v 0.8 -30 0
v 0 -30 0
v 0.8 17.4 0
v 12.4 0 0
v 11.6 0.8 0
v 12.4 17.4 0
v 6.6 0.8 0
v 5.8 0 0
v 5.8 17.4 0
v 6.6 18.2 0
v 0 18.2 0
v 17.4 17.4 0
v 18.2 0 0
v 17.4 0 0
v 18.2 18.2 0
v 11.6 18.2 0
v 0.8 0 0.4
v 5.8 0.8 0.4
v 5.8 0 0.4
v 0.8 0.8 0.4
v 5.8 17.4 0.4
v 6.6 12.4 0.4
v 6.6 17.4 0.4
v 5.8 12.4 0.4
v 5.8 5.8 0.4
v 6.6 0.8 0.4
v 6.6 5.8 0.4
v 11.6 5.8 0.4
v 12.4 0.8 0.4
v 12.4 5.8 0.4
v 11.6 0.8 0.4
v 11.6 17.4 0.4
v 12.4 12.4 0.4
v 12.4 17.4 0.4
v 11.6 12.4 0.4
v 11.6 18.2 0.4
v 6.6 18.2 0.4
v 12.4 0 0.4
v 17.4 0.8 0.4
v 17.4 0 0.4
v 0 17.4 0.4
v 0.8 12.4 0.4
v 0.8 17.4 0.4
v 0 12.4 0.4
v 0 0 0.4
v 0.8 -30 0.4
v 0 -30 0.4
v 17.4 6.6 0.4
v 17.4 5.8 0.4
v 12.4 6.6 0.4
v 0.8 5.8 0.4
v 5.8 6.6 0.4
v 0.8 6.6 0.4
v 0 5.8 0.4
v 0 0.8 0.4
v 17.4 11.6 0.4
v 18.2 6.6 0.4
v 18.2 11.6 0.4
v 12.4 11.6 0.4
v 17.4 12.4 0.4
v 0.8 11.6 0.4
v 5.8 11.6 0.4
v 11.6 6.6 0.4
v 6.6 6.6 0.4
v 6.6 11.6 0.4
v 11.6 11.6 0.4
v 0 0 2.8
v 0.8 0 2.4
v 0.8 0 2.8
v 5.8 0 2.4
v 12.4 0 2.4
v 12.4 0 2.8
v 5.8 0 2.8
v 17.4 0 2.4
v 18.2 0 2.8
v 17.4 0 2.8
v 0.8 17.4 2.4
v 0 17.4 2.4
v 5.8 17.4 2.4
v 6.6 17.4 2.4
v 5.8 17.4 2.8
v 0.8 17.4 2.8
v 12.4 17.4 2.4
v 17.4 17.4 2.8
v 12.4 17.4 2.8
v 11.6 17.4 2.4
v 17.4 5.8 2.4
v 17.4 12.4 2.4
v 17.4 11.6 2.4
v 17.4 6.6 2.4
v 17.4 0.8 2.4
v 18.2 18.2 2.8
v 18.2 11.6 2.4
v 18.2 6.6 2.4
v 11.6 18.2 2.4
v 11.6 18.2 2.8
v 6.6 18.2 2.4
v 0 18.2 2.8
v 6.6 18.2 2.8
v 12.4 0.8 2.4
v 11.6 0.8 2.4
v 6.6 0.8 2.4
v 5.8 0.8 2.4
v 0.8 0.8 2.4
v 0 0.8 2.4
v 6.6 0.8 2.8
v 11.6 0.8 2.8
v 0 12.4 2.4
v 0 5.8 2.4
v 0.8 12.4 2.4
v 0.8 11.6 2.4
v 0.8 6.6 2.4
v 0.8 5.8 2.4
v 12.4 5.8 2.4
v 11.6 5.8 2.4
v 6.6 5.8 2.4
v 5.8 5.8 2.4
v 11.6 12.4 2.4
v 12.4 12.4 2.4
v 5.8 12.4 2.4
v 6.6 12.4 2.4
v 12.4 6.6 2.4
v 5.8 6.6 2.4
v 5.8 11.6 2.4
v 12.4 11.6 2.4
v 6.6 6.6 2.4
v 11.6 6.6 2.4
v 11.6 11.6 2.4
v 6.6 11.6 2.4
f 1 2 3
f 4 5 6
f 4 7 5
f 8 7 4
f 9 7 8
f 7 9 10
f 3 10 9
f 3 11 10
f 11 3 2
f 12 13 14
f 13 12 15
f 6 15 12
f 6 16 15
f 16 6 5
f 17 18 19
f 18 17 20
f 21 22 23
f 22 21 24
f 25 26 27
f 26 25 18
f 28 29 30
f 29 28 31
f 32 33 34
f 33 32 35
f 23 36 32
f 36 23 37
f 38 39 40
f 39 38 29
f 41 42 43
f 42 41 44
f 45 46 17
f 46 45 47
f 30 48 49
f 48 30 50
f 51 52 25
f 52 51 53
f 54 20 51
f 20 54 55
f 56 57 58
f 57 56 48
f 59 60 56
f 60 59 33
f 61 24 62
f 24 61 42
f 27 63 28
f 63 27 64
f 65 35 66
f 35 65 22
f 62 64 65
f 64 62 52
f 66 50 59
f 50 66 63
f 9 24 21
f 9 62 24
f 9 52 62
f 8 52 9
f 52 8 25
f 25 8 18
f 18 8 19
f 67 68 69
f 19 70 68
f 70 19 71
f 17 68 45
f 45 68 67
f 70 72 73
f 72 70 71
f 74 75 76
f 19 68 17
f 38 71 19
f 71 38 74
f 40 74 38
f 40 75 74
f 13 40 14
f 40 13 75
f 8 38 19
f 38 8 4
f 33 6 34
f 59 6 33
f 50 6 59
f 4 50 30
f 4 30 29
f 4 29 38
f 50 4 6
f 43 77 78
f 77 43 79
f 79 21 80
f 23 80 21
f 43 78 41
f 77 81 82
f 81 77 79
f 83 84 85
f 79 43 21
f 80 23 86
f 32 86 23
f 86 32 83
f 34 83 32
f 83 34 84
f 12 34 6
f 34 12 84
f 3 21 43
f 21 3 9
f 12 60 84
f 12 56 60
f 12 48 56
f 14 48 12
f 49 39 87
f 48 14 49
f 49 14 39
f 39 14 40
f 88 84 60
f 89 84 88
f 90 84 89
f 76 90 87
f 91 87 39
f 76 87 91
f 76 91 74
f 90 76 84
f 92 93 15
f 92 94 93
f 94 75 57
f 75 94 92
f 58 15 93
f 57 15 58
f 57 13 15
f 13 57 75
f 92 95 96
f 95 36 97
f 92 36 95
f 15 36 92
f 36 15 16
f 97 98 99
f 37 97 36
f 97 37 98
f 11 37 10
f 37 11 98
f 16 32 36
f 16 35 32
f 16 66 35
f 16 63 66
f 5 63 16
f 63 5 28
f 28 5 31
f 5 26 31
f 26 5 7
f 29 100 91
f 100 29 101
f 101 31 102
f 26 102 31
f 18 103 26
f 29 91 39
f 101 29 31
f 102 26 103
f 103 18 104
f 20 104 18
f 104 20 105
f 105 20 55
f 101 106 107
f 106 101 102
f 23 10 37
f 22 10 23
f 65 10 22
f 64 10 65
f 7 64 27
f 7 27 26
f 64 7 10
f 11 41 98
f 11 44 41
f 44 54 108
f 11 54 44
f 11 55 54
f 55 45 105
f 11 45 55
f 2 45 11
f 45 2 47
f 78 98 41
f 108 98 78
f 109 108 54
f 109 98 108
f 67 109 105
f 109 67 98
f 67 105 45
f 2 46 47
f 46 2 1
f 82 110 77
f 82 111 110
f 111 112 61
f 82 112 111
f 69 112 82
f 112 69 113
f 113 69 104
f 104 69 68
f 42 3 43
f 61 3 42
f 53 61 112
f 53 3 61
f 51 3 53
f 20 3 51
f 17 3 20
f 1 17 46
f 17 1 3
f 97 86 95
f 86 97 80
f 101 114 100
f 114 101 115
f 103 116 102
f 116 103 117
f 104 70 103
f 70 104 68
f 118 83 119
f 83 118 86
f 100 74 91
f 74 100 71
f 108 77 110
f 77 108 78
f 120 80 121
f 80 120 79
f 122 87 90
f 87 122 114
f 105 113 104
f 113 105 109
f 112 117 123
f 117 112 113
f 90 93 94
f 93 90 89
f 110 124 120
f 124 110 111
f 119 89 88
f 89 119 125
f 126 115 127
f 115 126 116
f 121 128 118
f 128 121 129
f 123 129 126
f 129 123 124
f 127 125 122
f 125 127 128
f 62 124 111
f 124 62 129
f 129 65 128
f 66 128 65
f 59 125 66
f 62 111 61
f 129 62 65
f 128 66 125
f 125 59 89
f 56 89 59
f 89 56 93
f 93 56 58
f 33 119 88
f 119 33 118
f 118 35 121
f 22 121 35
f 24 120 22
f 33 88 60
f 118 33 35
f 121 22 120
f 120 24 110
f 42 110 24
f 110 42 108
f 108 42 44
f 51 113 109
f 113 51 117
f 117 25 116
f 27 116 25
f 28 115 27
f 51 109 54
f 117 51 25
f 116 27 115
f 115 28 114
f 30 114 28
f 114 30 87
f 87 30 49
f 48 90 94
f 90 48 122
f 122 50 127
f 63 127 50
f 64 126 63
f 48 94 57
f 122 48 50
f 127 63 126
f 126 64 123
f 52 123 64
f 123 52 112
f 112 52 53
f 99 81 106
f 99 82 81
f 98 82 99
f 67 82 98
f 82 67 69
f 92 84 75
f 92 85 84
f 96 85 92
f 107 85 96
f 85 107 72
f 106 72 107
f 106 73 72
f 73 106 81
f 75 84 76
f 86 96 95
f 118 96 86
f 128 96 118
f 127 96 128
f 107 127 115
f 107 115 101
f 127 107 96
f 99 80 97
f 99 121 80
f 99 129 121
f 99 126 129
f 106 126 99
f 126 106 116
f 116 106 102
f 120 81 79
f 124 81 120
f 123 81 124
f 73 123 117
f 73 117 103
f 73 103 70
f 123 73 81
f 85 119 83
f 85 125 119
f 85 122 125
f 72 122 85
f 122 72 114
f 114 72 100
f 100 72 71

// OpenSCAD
// file: ../../api/v3/reporting.scad
//////////////////////////////////////////////////////////////////////
// LibFile: reporting.scad
// Project: Grid Stack
// FileGroup: API v3 Reporting
// FileSummary: Console report for immutable direct and positive-gap coupons.
// Role: Records the exact environment, dimensions, support strategy, path
//       lengths, qualification status, and deposited-layer counts.
// Requires: API v3 indexes, mathematics, and path generator.
// Exports: report_structural_coupon_object().
//////////////////////////////////////////////////////////////////////

function _bridge_status3(span, process) =
    span <= process[PX3_BRIDGE_MAX]
        ? "within_owner_tested_limit"
        : "exploratory_beyond_owner_tested_limit";

module report_structural_coupon_object(object, report_level = "full") {
    material = object[SCO_MATERIAL];
    nozzle = object[SCO_NOZZLE];
    printer = object[SCO_PRINTER];
    process = object[SCO_PROCESS];
    boundary = object[SCO_BOUNDARY];
    gap = object[SCO_CLEAR_GAP];
    strategy = object[SCO_SUPPORT_STRATEGY];

    echo("--- Grid Stack immutable structural coupon ---");
    echo(str("Object: ", object[SCO_NAME], " revision ", object[SCO_REVISION]));
    echo(str("API/schema: ", object[SCO_REQUIRED_API], "/",
        object[SCO_SCHEMA_VERSION]));
    echo(str("Release/base commit: ", object[SCO_SOURCE_RELEASE], " / ",
        object[SCO_FRAMEWORK_BASE_COMMIT]));
    echo(str("Material/nozzle/printer: ", material[MAT3_FAMILY], " / ",
        nozzle[NZ3_DIAMETER], " mm / ", printer[PRN3_NAME]));
    echo(str("Cells: ", boundary[B3_CELLS_X], " x ", boundary[B3_CELLS_Y]));
    echo(str("Clear spans: ", boundary[B3_CLEAR_SPAN_X], " x ",
        boundary[B3_CLEAR_SPAN_Y], " mm"));
    echo(str("Span status: ",
        _bridge_status3(boundary[B3_CLEAR_SPAN_X], process)));
    echo(str("Outside size: ", boundary_size_x3(boundary, process, nozzle),
        " x ", boundary_size_y3(boundary, process, nozzle), " mm"));
    echo(str("Primitive trace: ", trace_width3(nozzle), " x ",
        trace_height3(process), " mm"));
    echo(str("Structural strand: ", strand_width3(process, nozzle), " x ",
        strand_height3(process), " mm"));
    echo(str("Clear vertical gap: ", gap, " mm"));
    echo(str("Support strategy: ", strategy));
    echo(str("Total modeled height: ", coupon_total_height3(object), " mm"));

    if (report_level == "full") {
        if (strategy == "direct_orthogonal") {
            lower = coupon_path(
                boundary, process, nozzle, 0, object[SCO_LEAD_IN]
            );
            upper = coupon_path(boundary, process, nozzle, 90, 0);
            echo(str("Lower/upper path lengths: ", path_length3(lower),
                " / ", path_length3(upper), " mm"));
            echo(str("Deposited layers: ", 2 * process[PX3_HEIGHT_PASSES]));
        }
        else {
            witness = coupon_path(
                boundary, process, nozzle, 90, object[SCO_LEAD_IN]
            );
            riser = coupon_path(boundary, process, nozzle, 0, 0);
            test = coupon_path(boundary, process, nozzle, 90, 0);
            echo(str("Witness/riser/test path lengths: ",
                path_length3(witness), " / ", path_length3(riser), " / ",
                path_length3(test), " mm"));
            echo(str("Riser deposited layers: ", round(gap_layer_count3(object))));
            echo(str("Total deposited layers: ",
                2 * process[PX3_HEIGHT_PASSES] +
                round(gap_layer_count3(object))));
        }
        echo(str("Status: ", object[SCO_STATUS]));
        echo(str("Notes: ", object[SCO_NOTES]));
    }
}
// file: ../../api/v3/validation.scad
//////////////////////////////////////////////////////////////////////
// LibFile: validation.scad
// Project: Grid Stack
// FileGroup: API v3 Validation
// FileSummary: Validates immutable environment records, count boundaries,
//              support strategy, path continuity, and layer quantization.
// Role: Rejects incompatible or physically floating recipes before geometry
//       is generated.
// Requires: API v3 indexes, mathematics, and path generator.
// Exports: validate_structural_coupon_object().
//////////////////////////////////////////////////////////////////////

module _validate_path3(points, boundary, orientation, lead_in) {
    run_count = orientation == 0
        ? boundary_strand_count_y3(boundary)
        : boundary_strand_count_x3(boundary);

    assert(len(points) == expected_coupon_point_count3(run_count, lead_in),
        "API v3 coupon path has an unexpected point count.");
    assert(!path_has_zero_segment3(points),
        "API v3 coupon path contains a zero-length segment.");
    assert(path_axis_aligned3(points),
        "API v3 coupon path must remain axis-aligned.");
    assert(points[0] != points[len(points) - 1],
        "API v3 coupon path must remain open.");
}

module validate_structural_coupon_object(object) {
    assert(object[SCO_REQUIRED_API] == GRID_STACK_API_VERSION,
        "Saved coupon requires a different Grid Stack API version.");
    assert(object[SCO_SCHEMA_VERSION] == GRID_STACK_COUPON_SCHEMA_VERSION,
        "Saved coupon requires a different coupon schema version.");
    assert(GRID_STACK_RECTANGULAR_FRAMEWORK_VERSION == 2,
        "Saved coupon requires rectangular framework version 2.");

    material = object[SCO_MATERIAL];
    nozzle = object[SCO_NOZZLE];
    printer = object[SCO_PRINTER];
    process = object[SCO_PROCESS];
    boundary = object[SCO_BOUNDARY];
    gap = object[SCO_CLEAR_GAP];
    lead_in = object[SCO_LEAD_IN];
    strategy = object[SCO_SUPPORT_STRATEGY];

    assert(nozzle[NZ3_DIAMETER] > 0,
        "Saved coupon nozzle diameter must be positive.");
    assert(process[PX3_LAYER_H] > 0,
        "Saved coupon layer height must be positive.");
    assert(process[PX3_WIDTH_PASSES] >= 2,
        "Saved coupon structural width requires at least two passes.");
    assert(process[PX3_HEIGHT_PASSES] >= 2,
        "Saved coupon structural height requires at least two layers.");
    assert(process[PX3_MATERIAL] == material[MAT3_NAME],
        "Saved coupon process/material references do not match.");
    assert(process[PX3_NOZZLE] == nozzle[NZ3_NAME],
        "Saved coupon process/nozzle references do not match.");
    assert(process[PX3_PRINTER] == printer[PRN3_NAME],
        "Saved coupon process/printer references do not match.");
    assert(boundary[B3_CELLS_X] > 0 && boundary[B3_CELLS_Y] > 0,
        "Saved coupon cell counts must be positive.");
    assert(boundary[B3_CLEAR_SPAN_X] > 0 &&
           boundary[B3_CLEAR_SPAN_Y] > 0,
        "Saved coupon clear spans must be positive.");
    assert(lead_in >= 0,
        "Saved coupon lead-in cannot be negative.");
    assert(gap >= 0,
        "Saved coupon clear gap cannot be negative.");
    assert(nearly_equal3(gap_layer_count3(object), round(gap_layer_count3(object))),
        "Saved coupon clear gap must equal a whole deposited-layer count.");
    assert(
        (strategy == "direct_orthogonal" && nearly_equal3(gap, 0)) ||
        (strategy == "witness_riser_bridge" && gap > 0),
        "Saved coupon support strategy does not match its clear gap."
    );

    if (strategy == "direct_orthogonal") {
        lower = coupon_path(boundary, process, nozzle, 0, lead_in);
        upper = coupon_path(boundary, process, nozzle, 90, 0);
        _validate_path3(lower, boundary, 0, lead_in);
        _validate_path3(upper, boundary, 90, 0);
        entry = lead_in > 0 ? 1 : 0;
        assert(nearly_equal3(point_distance_2d3(lower[entry], upper[0]), 0),
            "Direct upper path must start on the lower entry crossing.");
    }
    else {
        witness = coupon_path(boundary, process, nozzle, 90, lead_in);
        riser = coupon_path(boundary, process, nozzle, 0, 0);
        test = coupon_path(boundary, process, nozzle, 90, 0);
        _validate_path3(witness, boundary, 90, lead_in);
        _validate_path3(riser, boundary, 0, 0);
        _validate_path3(test, boundary, 90, 0);
        entry = lead_in > 0 ? 1 : 0;
        assert(nearly_equal3(point_distance_2d3(witness[entry], riser[0]), 0),
            "Riser path must start on the witness entry crossing.");
        assert(nearly_equal3(point_distance_2d3(riser[0], test[0]), 0),
            "Upper test path must start on the riser entry crossing.");
        for (i = [0 : len(test) - 1])
            assert(nearly_equal3(point_distance_2d3(test[i], witness[i + entry]), 0),
                "Upper test path must align directly above the witness path.");
    }

    echo("GRID STACK API V3 COUPON VALIDATION: PASS");
}
// file: ../../api/v3/geometry.scad
//////////////////////////////////////////////////////////////////////
// LibFile: geometry.scad
// Project: Grid Stack
// FileGroup: API v3 Printable Geometry
// FileSummary: Creates square-ended structural paths, direct-contact coupons,
//              positive witness/riser/bridge coupons, and simple diagnostics.
// Role: Supplies all geometry used by immutable API v3 recipes without
//       importing mutable workbench geometry.
// Requires: API v3 mathematics and ordered axis-aligned paths.
// Exports: render_direct_coupon(), render_positive_gap_coupon(), and
//          render_coupon_path_debug().
//////////////////////////////////////////////////////////////////////

module _segment_2d3(a, b, width) {
    horizontal = nearly_equal3(a[1], b[1]);
    vertical = nearly_equal3(a[0], b[0]);

    assert(horizontal || vertical,
        "API v3 printable segments must be horizontal or vertical.");
    assert(!nearly_equal3(point_distance_2d3(a, b), 0),
        "API v3 printable segments must have nonzero length.");

    if (horizontal)
        translate([min(a[0], b[0]) - width / 2, a[1] - width / 2])
            square([abs(b[0] - a[0]) + width, width]);
    else
        translate([a[0] - width / 2, min(a[1], b[1]) - width / 2])
            square([width, abs(b[1] - a[1]) + width]);
}

module _path_2d3(points, width) {
    union()
        for (i = [0 : len(points) - 2])
            _segment_2d3(points[i], points[i + 1], width);
}

module _structural_path3(points, process, nozzle) {
    linear_extrude(height = strand_height3(process), convexity = 10)
        _path_2d3(points, strand_width3(process, nozzle));
}

module render_direct_coupon(lower, upper, process, nozzle) {
    union() {
        _structural_path3(lower, process, nozzle);
        translate([0, 0, strand_height3(process)])
            _structural_path3(upper, process, nozzle);
    }
}

module render_positive_gap_coupon(
    witness, riser, test, process, nozzle, clear_gap
) {
    union() {
        _structural_path3(witness, process, nozzle);

        translate([0, 0, strand_height3(process)])
            linear_extrude(height = clear_gap, convexity = 10)
                _path_2d3(riser, strand_width3(process, nozzle));

        translate([0, 0, strand_height3(process) + clear_gap])
            _structural_path3(test, process, nozzle);
    }
}

module _debug_path3(points, z, width) {
    translate([0, 0, z])
        linear_extrude(height = 0.04)
            _path_2d3(points, width);
}

module render_coupon_path_debug(
    lower, upper, riser, process, clear_gap = 0
) {
    width = max(0.12, trace_height3(process));
    _debug_path3(lower, 0, width);
    if (len(riser) > 0)
        _debug_path3(riser, strand_height3(process), width);
    _debug_path3(
        upper,
        strand_height3(process) + clear_gap,
        width
    );
}
// file: ../../api/v3/paths.scad
//////////////////////////////////////////////////////////////////////
// LibFile: paths.scad
// Project: Grid Stack
// FileGroup: API v3 Path Generation
// FileSummary: Generates one open rectangular serpentine centerline from a
//              count boundary for X- or Y-running structural paths.
// Role: Preserves parallel runs, square connectors, optional single lead-in,
//       and one uninterrupted ordered point list per deposited layer.
// Requires: API v3 indexes and mathematics.
// Exports: coupon_path() and expected_coupon_point_count3().
//////////////////////////////////////////////////////////////////////

function _x_rows3(row, count, x_min, x_max, y_min, pitch) =
    row >= count
        ? []
        : let(
            y = y_min + row * pitch,
            x_end = row % 2 == 0 ? x_max : x_min,
            row_end = [x_end, y],
            connector_end = [x_end, y + pitch]
        )
        concat(
            [row_end],
            row < count - 1 ? [connector_end] : [],
            _x_rows3(row + 1, count, x_min, x_max, y_min, pitch)
        );

function _y_columns3(column, count, x_min, y_min, y_max, pitch) =
    column >= count
        ? []
        : let(
            x = x_min + column * pitch,
            y_end = column % 2 == 0 ? y_max : y_min,
            column_end = [x, y_end],
            connector_end = [x + pitch, y_end]
        )
        concat(
            [column_end],
            column < count - 1 ? [connector_end] : [],
            _y_columns3(column + 1, count, x_min, y_min, y_max, pitch)
        );

function expected_coupon_point_count3(run_count, lead_in = 0) =
    2 * run_count + (lead_in > 0 ? 1 : 0);

function coupon_path(
    boundary, process, nozzle, orientation = 0, lead_in = 0
) =
    assert(orientation == 0 || orientation == 90,
        "API v3 coupon orientation must be 0 or 90 degrees.")
    assert(lead_in >= 0,
        "API v3 coupon lead-in cannot be negative.")
    let(
        width = strand_width3(process, nozzle),
        x_min = width / 2,
        y_min = width / 2,
        x_max = boundary_size_x3(boundary, process, nozzle) - width / 2,
        y_max = boundary_size_y3(boundary, process, nozzle) - width / 2,
        entry = [x_min, y_min],
        prefix = lead_in > 0
            ? (orientation == 0
                ? [[x_min - lead_in, y_min], entry]
                : [[x_min, y_min - lead_in], entry])
            : [entry]
    )
    orientation == 0
        ? concat(
            prefix,
            _x_rows3(
                0, boundary_strand_count_y3(boundary),
                x_min, x_max, y_min,
                boundary_pitch_y3(boundary, process, nozzle)
            )
        )
        : concat(
            prefix,
            _y_columns3(
                0, boundary_strand_count_x3(boundary),
                x_min, y_min, y_max,
                boundary_pitch_x3(boundary, process, nozzle)
            )
        );
// file: ../../api/v3/math.scad
//////////////////////////////////////////////////////////////////////
// LibFile: math.scad
// Project: Grid Stack
// FileGroup: API v3 Mathematics
// FileSummary: Pure trace, strand, boundary, path, and layer-count helpers.
// Role: Keeps API v3 calculations isolated and reproducible without importing
//       mutable workbench mathematics.
// Requires: API v3 indexes.
// Exports: nearly_equal3(), trace/strand dimensions, boundary dimensions,
//          path inspection, gap-layer count, and total-height helpers.
//////////////////////////////////////////////////////////////////////

function nearly_equal3(a, b, epsilon = 0.000001) = abs(a - b) <= epsilon;

function trace_width3(nozzle) = nozzle[NZ3_DIAMETER];
function trace_height3(process) = process[PX3_LAYER_H];
function strand_width3(process, nozzle) =
    trace_width3(nozzle) * process[PX3_WIDTH_PASSES];
function strand_height3(process) =
    trace_height3(process) * process[PX3_HEIGHT_PASSES];

function boundary_strand_count_x3(boundary) = boundary[B3_CELLS_X] + 1;
function boundary_strand_count_y3(boundary) = boundary[B3_CELLS_Y] + 1;
function boundary_pitch_x3(boundary, process, nozzle) =
    boundary[B3_CLEAR_SPAN_X] + strand_width3(process, nozzle);
function boundary_pitch_y3(boundary, process, nozzle) =
    boundary[B3_CLEAR_SPAN_Y] + strand_width3(process, nozzle);
function boundary_size_x3(boundary, process, nozzle) =
    boundary[B3_CELLS_X] * boundary[B3_CLEAR_SPAN_X] +
    boundary_strand_count_x3(boundary) * strand_width3(process, nozzle);
function boundary_size_y3(boundary, process, nozzle) =
    boundary[B3_CELLS_Y] * boundary[B3_CLEAR_SPAN_Y] +
    boundary_strand_count_y3(boundary) * strand_width3(process, nozzle);

function point_distance_2d3(a, b) =
    sqrt(pow(b[0] - a[0], 2) + pow(b[1] - a[1], 2));
function path_length3(points, i = 0) =
    i >= len(points) - 1
        ? 0
        : point_distance_2d3(points[i], points[i + 1]) +
          path_length3(points, i + 1);
function path_has_zero_segment3(points, i = 0) =
    i >= len(points) - 1
        ? false
        : nearly_equal3(point_distance_2d3(points[i], points[i + 1]), 0)
            ? true
            : path_has_zero_segment3(points, i + 1);
function segment_axis_aligned3(a, b) =
    nearly_equal3(a[0], b[0]) || nearly_equal3(a[1], b[1]);
function path_axis_aligned3(points, i = 0) =
    i >= len(points) - 1
        ? true
        : segment_axis_aligned3(points[i], points[i + 1]) &&
          path_axis_aligned3(points, i + 1);

function gap_layer_count3(object) =
    object[SCO_CLEAR_GAP] / trace_height3(object[SCO_PROCESS]);
function coupon_total_height3(object) =
    2 * strand_height3(object[SCO_PROCESS]) + object[SCO_CLEAR_GAP];
// file: ../../api/v3/schema.scad
//////////////////////////////////////////////////////////////////////
// LibFile: schema.scad
// Project: Grid Stack
// FileGroup: API v3 Data Model
// FileSummary: Constructors for self-contained immutable structural coupons.
// Role: Makes every geometry-affecting environment and object value explicit
//       inside the saved recipe rather than resolving mutable catalog names.
// Exports: material_spec(), nozzle_spec(), printer_spec(),
//          structural_process_profile(), count_boundary(), and
//          structural_coupon_object().
//////////////////////////////////////////////////////////////////////

function material_spec(
    name, family, flexibility, status = "in_use", notes = ""
) = [name, family, flexibility, status, notes];

function nozzle_spec(
    name, diameter, construction = "brass", status = "in_use", notes = ""
) = [name, diameter, construction, status, notes];

function printer_spec(
    name,
    manufacturer = "",
    model = "",
    motion_system = "",
    build_surface = "",
    status = "unrecorded",
    notes = ""
) = [
    name, manufacturer, model, motion_system,
    build_surface, status, notes
];

function structural_process_profile(
    name,
    material_name,
    nozzle_name,
    printer_name,
    layer_height,
    width_passes,
    height_passes,
    bridge_max,
    qualification,
    revision,
    notes = ""
) = [
    name, material_name, nozzle_name, printer_name,
    layer_height, width_passes, height_passes, bridge_max,
    qualification, revision, notes
];

// Function: count_boundary()
// Synopsis: Stores clear-opening counts and clear spans for one rectangle.
function count_boundary(
    name,
    cells_x,
    cells_y,
    clear_span_x,
    clear_span_y,
    notes = ""
) = [name, cells_x, cells_y, clear_span_x, clear_span_y, notes];

// Function: structural_coupon_object()
// Synopsis: Constructs one permanent coupon recipe.
// Description:
//   framework_base_commit records the last accepted repository state used to
//   begin the API implementation. The Git commit containing this recipe is the
//   authoritative complete source; a file cannot embed its own future hash.
function structural_coupon_object(
    name,
    revision,
    required_api_version,
    coupon_schema_version,
    source_release,
    framework_base_commit,
    material,
    nozzle,
    printer,
    process,
    boundary,
    clear_vertical_gap,
    lead_in,
    support_strategy,
    status = "calibration",
    notes = ""
) = [
    name,
    revision,
    required_api_version,
    coupon_schema_version,
    source_release,
    framework_base_commit,
    material,
    nozzle,
    printer,
    process,
    boundary,
    clear_vertical_gap,
    lead_in,
    support_strategy,
    status,
    notes
];
// file: ../../api/v3/indices.scad
//////////////////////////////////////////////////////////////////////
// LibFile: indices.scad
// Project: Grid Stack
// FileGroup: API v3 Data Model
// FileSummary: Named indexes for immutable structural-coupon records.
// Role: Prevents unexplained numeric indexes from entering saved recipes and
//       keeps API version 3 independent of mutable workbench indexes.
// Exports: MAT3_*, NZ3_*, PRN3_*, PX3_*, B3_*, and SCO_* constants.
//////////////////////////////////////////////////////////////////////

MAT3_NAME = 0;
MAT3_FAMILY = 1;
MAT3_FLEXIBILITY = 2;
MAT3_STATUS = 3;
MAT3_NOTES = 4;

NZ3_NAME = 0;
NZ3_DIAMETER = 1;
NZ3_CONSTRUCTION = 2;
NZ3_STATUS = 3;
NZ3_NOTES = 4;

PRN3_NAME = 0;
PRN3_MANUFACTURER = 1;
PRN3_MODEL = 2;
PRN3_MOTION_SYSTEM = 3;
PRN3_BUILD_SURFACE = 4;
PRN3_STATUS = 5;
PRN3_NOTES = 6;

PX3_NAME = 0;
PX3_MATERIAL = 1;
PX3_NOZZLE = 2;
PX3_PRINTER = 3;
PX3_LAYER_H = 4;
PX3_WIDTH_PASSES = 5;
PX3_HEIGHT_PASSES = 6;
PX3_BRIDGE_MAX = 7;
PX3_QUALIFICATION = 8;
PX3_REVISION = 9;
PX3_NOTES = 10;

B3_NAME = 0;
B3_CELLS_X = 1;
B3_CELLS_Y = 2;
B3_CLEAR_SPAN_X = 3;
B3_CLEAR_SPAN_Y = 4;
B3_NOTES = 5;

SCO_NAME = 0;
SCO_REVISION = 1;
SCO_REQUIRED_API = 2;
SCO_SCHEMA_VERSION = 3;
SCO_SOURCE_RELEASE = 4;
SCO_FRAMEWORK_BASE_COMMIT = 5;
SCO_MATERIAL = 6;
SCO_NOZZLE = 7;
SCO_PRINTER = 8;
SCO_PROCESS = 9;
SCO_BOUNDARY = 10;
SCO_CLEAR_GAP = 11;
SCO_LEAD_IN = 12;
SCO_SUPPORT_STRATEGY = 13;
SCO_STATUS = 14;
SCO_NOTES = 15;
// file: ../../api/grid_stack_v3.scad
//////////////////////////////////////////////////////////////////////
// LibFile: grid_stack_v3.scad
// Project: Grid Stack
// FileGroup: Versioned Public Interface
// FileSummary: Immutable API version 3 for rectangular count-boundary
//              structural coupons, including positive witness/riser gaps.
// Role: Reconstructs saved coupon recipes without Customizer state or mutable
//       workbench catalogs. Incompatible behavior requires a new API file.
// Exports: API/schema constants, record constructors, validation, reporting,
//          and structural_coupon_render().
//////////////////////////////////////////////////////////////////////

GRID_STACK_API_VERSION = 3;
GRID_STACK_COUPON_SCHEMA_VERSION = 1;
GRID_STACK_RECTANGULAR_FRAMEWORK_VERSION = 2;
GRID_STACK_RELEASE = "1.0.0";

include <v3/indices.scad>
include <v3/schema.scad>
include <v3/math.scad>
include <v3/paths.scad>
include <v3/geometry.scad>
include <v3/validation.scad>
include <v3/reporting.scad>

// Module: structural_coupon_render()
// Synopsis: Validates, reports, and renders one immutable coupon recipe.
// Arguments:
//   object = Record returned by structural_coupon_object().
//   mode = print, path_debug, or report_only.
//   report_level = summary or full.
module structural_coupon_render(
    object,
    mode = "print",
    report_level = "full"
) {
    validate_structural_coupon_object(object);
    report_structural_coupon_object(object, report_level);

    boundary = object[SCO_BOUNDARY];
    process = object[SCO_PROCESS];
    nozzle = object[SCO_NOZZLE];
    lead_in = object[SCO_LEAD_IN];
    clear_gap = object[SCO_CLEAR_GAP];
    strategy = object[SCO_SUPPORT_STRATEGY];

    if (strategy == "direct_orthogonal") {
        lower = coupon_path(boundary, process, nozzle, 0, lead_in);
        upper = coupon_path(boundary, process, nozzle, 90, 0);

        if (mode == "print")
            render_direct_coupon(lower, upper, process, nozzle);
        else if (mode == "path_debug")
            render_coupon_path_debug(lower, upper, [], process);
        else if (mode == "report_only")
            echo("Grid Stack API v3 report-only mode: no geometry generated.");
        else
            assert(false, str("Unknown API v3 render mode: ", mode));
    }
    else if (strategy == "witness_riser_bridge") {
        witness = coupon_path(boundary, process, nozzle, 90, lead_in);
        riser = coupon_path(boundary, process, nozzle, 0, 0);
        test = coupon_path(boundary, process, nozzle, 90, 0);

        if (mode == "print")
            render_positive_gap_coupon(
                witness, riser, test, process, nozzle, clear_gap
            );
        else if (mode == "path_debug")
            render_coupon_path_debug(witness, test, riser, process, clear_gap);
        else if (mode == "report_only")
            echo("Grid Stack API v3 report-only mode: no geometry generated.");
        else
            assert(false, str("Unknown API v3 render mode: ", mode));
    }
    else
        assert(false, str("Unknown coupon support strategy: ", strategy));
}
// main file
//////////////////////////////////////////////////////////////////////
// LibFile: coupon-3x3-span5-gap2-pla-plus-0p4-v1.scad
// Project: Grid Stack
// FileGroup: Immutable Structural Coupon
// FileSummary: 3 x 3 PLA+ coupon with 5 mm clear XY spans and 2 mm
//              clear vertical gap using witness_riser_bridge geometry.
// Role: Permanently reconstructs one calibration object without Customizer
//       state or mutable workbench catalog lookup.
// FrameworkBaseCommit: 4b5e564
// Requires: Grid Stack API version 3 and coupon schema version 1.
// Output: Printable continuous-path structural coupon geometry.
//////////////////////////////////////////////////////////////////////

include <../../api/grid_stack_v3.scad>

assert(GRID_STACK_API_VERSION == 3,
    "This recipe requires Grid Stack API version 3.");
assert(GRID_STACK_COUPON_SCHEMA_VERSION == 1,
    "This recipe requires coupon schema version 1.");
assert(GRID_STACK_RECTANGULAR_FRAMEWORK_VERSION == 2,
    "This recipe requires rectangular framework version 2.");

saved_material = material_spec(
    name = "PLA_PLUS",
    family = "PLA+",
    flexibility = "rigid",
    status = "in_use",
    notes = "Exact material family selected for the coupon matrix."
);

saved_nozzle = nozzle_spec(
    name = "BRASS_0P4",
    diameter = 0.4,
    construction = "brass",
    status = "in_use",
    notes = "Nominal nozzle diameter used to derive the 0.8 mm strand width."
);

saved_printer = printer_spec(
    name = "UNRECORDED_PRINTER_R1",
    manufacturer = "",
    model = "",
    motion_system = "",
    build_surface = "",
    status = "unrecorded",
    notes = "Printer identity was not frozen with this coupon framework."
);

saved_process = structural_process_profile(
    name = "PLA_PLUS_0P4_LH0P2_W2_H2_R1",
    material_name = "PLA_PLUS",
    nozzle_name = "BRASS_0P4",
    printer_name = "UNRECORDED_PRINTER_R1",
    layer_height = 0.2,
    width_passes = 2,
    height_passes = 2,
    bridge_max = 6,
    qualification = "owner_tested_to_6mm",
    revision = 1,
    notes = "Primitive trace 0.4 x 0.2 mm; structural strand 0.8 x 0.4 mm."
);

saved_boundary = count_boundary(
    name = "COUNT_3X3_SPAN5",
    cells_x = 3,
    cells_y = 3,
    clear_span_x = 5,
    clear_span_y = 5,
    notes = "Outside dimensions derive from four strands and three clear openings."
);

saved_coupon = structural_coupon_object(
    name = "COUPON_3X3_SPAN5_GAP2_PLA_PLUS_0P4_V1",
    revision = 1,
    required_api_version = 3,
    coupon_schema_version = 1,
    source_release = "1.0.0",
    framework_base_commit = "4b5e564",
    material = saved_material,
    nozzle = saved_nozzle,
    printer = saved_printer,
    process = saved_process,
    boundary = saved_boundary,
    clear_vertical_gap = 2,
    lead_in = 30,
    support_strategy = "witness_riser_bridge",
    status = "calibration_unprinted",
    notes = "Calibration recipe generated from the frozen Batch 010 framework; record results in a new revision after printing."
);

structural_coupon_render(
    saved_coupon,
    mode = "print",
    report_level = "full"
);
